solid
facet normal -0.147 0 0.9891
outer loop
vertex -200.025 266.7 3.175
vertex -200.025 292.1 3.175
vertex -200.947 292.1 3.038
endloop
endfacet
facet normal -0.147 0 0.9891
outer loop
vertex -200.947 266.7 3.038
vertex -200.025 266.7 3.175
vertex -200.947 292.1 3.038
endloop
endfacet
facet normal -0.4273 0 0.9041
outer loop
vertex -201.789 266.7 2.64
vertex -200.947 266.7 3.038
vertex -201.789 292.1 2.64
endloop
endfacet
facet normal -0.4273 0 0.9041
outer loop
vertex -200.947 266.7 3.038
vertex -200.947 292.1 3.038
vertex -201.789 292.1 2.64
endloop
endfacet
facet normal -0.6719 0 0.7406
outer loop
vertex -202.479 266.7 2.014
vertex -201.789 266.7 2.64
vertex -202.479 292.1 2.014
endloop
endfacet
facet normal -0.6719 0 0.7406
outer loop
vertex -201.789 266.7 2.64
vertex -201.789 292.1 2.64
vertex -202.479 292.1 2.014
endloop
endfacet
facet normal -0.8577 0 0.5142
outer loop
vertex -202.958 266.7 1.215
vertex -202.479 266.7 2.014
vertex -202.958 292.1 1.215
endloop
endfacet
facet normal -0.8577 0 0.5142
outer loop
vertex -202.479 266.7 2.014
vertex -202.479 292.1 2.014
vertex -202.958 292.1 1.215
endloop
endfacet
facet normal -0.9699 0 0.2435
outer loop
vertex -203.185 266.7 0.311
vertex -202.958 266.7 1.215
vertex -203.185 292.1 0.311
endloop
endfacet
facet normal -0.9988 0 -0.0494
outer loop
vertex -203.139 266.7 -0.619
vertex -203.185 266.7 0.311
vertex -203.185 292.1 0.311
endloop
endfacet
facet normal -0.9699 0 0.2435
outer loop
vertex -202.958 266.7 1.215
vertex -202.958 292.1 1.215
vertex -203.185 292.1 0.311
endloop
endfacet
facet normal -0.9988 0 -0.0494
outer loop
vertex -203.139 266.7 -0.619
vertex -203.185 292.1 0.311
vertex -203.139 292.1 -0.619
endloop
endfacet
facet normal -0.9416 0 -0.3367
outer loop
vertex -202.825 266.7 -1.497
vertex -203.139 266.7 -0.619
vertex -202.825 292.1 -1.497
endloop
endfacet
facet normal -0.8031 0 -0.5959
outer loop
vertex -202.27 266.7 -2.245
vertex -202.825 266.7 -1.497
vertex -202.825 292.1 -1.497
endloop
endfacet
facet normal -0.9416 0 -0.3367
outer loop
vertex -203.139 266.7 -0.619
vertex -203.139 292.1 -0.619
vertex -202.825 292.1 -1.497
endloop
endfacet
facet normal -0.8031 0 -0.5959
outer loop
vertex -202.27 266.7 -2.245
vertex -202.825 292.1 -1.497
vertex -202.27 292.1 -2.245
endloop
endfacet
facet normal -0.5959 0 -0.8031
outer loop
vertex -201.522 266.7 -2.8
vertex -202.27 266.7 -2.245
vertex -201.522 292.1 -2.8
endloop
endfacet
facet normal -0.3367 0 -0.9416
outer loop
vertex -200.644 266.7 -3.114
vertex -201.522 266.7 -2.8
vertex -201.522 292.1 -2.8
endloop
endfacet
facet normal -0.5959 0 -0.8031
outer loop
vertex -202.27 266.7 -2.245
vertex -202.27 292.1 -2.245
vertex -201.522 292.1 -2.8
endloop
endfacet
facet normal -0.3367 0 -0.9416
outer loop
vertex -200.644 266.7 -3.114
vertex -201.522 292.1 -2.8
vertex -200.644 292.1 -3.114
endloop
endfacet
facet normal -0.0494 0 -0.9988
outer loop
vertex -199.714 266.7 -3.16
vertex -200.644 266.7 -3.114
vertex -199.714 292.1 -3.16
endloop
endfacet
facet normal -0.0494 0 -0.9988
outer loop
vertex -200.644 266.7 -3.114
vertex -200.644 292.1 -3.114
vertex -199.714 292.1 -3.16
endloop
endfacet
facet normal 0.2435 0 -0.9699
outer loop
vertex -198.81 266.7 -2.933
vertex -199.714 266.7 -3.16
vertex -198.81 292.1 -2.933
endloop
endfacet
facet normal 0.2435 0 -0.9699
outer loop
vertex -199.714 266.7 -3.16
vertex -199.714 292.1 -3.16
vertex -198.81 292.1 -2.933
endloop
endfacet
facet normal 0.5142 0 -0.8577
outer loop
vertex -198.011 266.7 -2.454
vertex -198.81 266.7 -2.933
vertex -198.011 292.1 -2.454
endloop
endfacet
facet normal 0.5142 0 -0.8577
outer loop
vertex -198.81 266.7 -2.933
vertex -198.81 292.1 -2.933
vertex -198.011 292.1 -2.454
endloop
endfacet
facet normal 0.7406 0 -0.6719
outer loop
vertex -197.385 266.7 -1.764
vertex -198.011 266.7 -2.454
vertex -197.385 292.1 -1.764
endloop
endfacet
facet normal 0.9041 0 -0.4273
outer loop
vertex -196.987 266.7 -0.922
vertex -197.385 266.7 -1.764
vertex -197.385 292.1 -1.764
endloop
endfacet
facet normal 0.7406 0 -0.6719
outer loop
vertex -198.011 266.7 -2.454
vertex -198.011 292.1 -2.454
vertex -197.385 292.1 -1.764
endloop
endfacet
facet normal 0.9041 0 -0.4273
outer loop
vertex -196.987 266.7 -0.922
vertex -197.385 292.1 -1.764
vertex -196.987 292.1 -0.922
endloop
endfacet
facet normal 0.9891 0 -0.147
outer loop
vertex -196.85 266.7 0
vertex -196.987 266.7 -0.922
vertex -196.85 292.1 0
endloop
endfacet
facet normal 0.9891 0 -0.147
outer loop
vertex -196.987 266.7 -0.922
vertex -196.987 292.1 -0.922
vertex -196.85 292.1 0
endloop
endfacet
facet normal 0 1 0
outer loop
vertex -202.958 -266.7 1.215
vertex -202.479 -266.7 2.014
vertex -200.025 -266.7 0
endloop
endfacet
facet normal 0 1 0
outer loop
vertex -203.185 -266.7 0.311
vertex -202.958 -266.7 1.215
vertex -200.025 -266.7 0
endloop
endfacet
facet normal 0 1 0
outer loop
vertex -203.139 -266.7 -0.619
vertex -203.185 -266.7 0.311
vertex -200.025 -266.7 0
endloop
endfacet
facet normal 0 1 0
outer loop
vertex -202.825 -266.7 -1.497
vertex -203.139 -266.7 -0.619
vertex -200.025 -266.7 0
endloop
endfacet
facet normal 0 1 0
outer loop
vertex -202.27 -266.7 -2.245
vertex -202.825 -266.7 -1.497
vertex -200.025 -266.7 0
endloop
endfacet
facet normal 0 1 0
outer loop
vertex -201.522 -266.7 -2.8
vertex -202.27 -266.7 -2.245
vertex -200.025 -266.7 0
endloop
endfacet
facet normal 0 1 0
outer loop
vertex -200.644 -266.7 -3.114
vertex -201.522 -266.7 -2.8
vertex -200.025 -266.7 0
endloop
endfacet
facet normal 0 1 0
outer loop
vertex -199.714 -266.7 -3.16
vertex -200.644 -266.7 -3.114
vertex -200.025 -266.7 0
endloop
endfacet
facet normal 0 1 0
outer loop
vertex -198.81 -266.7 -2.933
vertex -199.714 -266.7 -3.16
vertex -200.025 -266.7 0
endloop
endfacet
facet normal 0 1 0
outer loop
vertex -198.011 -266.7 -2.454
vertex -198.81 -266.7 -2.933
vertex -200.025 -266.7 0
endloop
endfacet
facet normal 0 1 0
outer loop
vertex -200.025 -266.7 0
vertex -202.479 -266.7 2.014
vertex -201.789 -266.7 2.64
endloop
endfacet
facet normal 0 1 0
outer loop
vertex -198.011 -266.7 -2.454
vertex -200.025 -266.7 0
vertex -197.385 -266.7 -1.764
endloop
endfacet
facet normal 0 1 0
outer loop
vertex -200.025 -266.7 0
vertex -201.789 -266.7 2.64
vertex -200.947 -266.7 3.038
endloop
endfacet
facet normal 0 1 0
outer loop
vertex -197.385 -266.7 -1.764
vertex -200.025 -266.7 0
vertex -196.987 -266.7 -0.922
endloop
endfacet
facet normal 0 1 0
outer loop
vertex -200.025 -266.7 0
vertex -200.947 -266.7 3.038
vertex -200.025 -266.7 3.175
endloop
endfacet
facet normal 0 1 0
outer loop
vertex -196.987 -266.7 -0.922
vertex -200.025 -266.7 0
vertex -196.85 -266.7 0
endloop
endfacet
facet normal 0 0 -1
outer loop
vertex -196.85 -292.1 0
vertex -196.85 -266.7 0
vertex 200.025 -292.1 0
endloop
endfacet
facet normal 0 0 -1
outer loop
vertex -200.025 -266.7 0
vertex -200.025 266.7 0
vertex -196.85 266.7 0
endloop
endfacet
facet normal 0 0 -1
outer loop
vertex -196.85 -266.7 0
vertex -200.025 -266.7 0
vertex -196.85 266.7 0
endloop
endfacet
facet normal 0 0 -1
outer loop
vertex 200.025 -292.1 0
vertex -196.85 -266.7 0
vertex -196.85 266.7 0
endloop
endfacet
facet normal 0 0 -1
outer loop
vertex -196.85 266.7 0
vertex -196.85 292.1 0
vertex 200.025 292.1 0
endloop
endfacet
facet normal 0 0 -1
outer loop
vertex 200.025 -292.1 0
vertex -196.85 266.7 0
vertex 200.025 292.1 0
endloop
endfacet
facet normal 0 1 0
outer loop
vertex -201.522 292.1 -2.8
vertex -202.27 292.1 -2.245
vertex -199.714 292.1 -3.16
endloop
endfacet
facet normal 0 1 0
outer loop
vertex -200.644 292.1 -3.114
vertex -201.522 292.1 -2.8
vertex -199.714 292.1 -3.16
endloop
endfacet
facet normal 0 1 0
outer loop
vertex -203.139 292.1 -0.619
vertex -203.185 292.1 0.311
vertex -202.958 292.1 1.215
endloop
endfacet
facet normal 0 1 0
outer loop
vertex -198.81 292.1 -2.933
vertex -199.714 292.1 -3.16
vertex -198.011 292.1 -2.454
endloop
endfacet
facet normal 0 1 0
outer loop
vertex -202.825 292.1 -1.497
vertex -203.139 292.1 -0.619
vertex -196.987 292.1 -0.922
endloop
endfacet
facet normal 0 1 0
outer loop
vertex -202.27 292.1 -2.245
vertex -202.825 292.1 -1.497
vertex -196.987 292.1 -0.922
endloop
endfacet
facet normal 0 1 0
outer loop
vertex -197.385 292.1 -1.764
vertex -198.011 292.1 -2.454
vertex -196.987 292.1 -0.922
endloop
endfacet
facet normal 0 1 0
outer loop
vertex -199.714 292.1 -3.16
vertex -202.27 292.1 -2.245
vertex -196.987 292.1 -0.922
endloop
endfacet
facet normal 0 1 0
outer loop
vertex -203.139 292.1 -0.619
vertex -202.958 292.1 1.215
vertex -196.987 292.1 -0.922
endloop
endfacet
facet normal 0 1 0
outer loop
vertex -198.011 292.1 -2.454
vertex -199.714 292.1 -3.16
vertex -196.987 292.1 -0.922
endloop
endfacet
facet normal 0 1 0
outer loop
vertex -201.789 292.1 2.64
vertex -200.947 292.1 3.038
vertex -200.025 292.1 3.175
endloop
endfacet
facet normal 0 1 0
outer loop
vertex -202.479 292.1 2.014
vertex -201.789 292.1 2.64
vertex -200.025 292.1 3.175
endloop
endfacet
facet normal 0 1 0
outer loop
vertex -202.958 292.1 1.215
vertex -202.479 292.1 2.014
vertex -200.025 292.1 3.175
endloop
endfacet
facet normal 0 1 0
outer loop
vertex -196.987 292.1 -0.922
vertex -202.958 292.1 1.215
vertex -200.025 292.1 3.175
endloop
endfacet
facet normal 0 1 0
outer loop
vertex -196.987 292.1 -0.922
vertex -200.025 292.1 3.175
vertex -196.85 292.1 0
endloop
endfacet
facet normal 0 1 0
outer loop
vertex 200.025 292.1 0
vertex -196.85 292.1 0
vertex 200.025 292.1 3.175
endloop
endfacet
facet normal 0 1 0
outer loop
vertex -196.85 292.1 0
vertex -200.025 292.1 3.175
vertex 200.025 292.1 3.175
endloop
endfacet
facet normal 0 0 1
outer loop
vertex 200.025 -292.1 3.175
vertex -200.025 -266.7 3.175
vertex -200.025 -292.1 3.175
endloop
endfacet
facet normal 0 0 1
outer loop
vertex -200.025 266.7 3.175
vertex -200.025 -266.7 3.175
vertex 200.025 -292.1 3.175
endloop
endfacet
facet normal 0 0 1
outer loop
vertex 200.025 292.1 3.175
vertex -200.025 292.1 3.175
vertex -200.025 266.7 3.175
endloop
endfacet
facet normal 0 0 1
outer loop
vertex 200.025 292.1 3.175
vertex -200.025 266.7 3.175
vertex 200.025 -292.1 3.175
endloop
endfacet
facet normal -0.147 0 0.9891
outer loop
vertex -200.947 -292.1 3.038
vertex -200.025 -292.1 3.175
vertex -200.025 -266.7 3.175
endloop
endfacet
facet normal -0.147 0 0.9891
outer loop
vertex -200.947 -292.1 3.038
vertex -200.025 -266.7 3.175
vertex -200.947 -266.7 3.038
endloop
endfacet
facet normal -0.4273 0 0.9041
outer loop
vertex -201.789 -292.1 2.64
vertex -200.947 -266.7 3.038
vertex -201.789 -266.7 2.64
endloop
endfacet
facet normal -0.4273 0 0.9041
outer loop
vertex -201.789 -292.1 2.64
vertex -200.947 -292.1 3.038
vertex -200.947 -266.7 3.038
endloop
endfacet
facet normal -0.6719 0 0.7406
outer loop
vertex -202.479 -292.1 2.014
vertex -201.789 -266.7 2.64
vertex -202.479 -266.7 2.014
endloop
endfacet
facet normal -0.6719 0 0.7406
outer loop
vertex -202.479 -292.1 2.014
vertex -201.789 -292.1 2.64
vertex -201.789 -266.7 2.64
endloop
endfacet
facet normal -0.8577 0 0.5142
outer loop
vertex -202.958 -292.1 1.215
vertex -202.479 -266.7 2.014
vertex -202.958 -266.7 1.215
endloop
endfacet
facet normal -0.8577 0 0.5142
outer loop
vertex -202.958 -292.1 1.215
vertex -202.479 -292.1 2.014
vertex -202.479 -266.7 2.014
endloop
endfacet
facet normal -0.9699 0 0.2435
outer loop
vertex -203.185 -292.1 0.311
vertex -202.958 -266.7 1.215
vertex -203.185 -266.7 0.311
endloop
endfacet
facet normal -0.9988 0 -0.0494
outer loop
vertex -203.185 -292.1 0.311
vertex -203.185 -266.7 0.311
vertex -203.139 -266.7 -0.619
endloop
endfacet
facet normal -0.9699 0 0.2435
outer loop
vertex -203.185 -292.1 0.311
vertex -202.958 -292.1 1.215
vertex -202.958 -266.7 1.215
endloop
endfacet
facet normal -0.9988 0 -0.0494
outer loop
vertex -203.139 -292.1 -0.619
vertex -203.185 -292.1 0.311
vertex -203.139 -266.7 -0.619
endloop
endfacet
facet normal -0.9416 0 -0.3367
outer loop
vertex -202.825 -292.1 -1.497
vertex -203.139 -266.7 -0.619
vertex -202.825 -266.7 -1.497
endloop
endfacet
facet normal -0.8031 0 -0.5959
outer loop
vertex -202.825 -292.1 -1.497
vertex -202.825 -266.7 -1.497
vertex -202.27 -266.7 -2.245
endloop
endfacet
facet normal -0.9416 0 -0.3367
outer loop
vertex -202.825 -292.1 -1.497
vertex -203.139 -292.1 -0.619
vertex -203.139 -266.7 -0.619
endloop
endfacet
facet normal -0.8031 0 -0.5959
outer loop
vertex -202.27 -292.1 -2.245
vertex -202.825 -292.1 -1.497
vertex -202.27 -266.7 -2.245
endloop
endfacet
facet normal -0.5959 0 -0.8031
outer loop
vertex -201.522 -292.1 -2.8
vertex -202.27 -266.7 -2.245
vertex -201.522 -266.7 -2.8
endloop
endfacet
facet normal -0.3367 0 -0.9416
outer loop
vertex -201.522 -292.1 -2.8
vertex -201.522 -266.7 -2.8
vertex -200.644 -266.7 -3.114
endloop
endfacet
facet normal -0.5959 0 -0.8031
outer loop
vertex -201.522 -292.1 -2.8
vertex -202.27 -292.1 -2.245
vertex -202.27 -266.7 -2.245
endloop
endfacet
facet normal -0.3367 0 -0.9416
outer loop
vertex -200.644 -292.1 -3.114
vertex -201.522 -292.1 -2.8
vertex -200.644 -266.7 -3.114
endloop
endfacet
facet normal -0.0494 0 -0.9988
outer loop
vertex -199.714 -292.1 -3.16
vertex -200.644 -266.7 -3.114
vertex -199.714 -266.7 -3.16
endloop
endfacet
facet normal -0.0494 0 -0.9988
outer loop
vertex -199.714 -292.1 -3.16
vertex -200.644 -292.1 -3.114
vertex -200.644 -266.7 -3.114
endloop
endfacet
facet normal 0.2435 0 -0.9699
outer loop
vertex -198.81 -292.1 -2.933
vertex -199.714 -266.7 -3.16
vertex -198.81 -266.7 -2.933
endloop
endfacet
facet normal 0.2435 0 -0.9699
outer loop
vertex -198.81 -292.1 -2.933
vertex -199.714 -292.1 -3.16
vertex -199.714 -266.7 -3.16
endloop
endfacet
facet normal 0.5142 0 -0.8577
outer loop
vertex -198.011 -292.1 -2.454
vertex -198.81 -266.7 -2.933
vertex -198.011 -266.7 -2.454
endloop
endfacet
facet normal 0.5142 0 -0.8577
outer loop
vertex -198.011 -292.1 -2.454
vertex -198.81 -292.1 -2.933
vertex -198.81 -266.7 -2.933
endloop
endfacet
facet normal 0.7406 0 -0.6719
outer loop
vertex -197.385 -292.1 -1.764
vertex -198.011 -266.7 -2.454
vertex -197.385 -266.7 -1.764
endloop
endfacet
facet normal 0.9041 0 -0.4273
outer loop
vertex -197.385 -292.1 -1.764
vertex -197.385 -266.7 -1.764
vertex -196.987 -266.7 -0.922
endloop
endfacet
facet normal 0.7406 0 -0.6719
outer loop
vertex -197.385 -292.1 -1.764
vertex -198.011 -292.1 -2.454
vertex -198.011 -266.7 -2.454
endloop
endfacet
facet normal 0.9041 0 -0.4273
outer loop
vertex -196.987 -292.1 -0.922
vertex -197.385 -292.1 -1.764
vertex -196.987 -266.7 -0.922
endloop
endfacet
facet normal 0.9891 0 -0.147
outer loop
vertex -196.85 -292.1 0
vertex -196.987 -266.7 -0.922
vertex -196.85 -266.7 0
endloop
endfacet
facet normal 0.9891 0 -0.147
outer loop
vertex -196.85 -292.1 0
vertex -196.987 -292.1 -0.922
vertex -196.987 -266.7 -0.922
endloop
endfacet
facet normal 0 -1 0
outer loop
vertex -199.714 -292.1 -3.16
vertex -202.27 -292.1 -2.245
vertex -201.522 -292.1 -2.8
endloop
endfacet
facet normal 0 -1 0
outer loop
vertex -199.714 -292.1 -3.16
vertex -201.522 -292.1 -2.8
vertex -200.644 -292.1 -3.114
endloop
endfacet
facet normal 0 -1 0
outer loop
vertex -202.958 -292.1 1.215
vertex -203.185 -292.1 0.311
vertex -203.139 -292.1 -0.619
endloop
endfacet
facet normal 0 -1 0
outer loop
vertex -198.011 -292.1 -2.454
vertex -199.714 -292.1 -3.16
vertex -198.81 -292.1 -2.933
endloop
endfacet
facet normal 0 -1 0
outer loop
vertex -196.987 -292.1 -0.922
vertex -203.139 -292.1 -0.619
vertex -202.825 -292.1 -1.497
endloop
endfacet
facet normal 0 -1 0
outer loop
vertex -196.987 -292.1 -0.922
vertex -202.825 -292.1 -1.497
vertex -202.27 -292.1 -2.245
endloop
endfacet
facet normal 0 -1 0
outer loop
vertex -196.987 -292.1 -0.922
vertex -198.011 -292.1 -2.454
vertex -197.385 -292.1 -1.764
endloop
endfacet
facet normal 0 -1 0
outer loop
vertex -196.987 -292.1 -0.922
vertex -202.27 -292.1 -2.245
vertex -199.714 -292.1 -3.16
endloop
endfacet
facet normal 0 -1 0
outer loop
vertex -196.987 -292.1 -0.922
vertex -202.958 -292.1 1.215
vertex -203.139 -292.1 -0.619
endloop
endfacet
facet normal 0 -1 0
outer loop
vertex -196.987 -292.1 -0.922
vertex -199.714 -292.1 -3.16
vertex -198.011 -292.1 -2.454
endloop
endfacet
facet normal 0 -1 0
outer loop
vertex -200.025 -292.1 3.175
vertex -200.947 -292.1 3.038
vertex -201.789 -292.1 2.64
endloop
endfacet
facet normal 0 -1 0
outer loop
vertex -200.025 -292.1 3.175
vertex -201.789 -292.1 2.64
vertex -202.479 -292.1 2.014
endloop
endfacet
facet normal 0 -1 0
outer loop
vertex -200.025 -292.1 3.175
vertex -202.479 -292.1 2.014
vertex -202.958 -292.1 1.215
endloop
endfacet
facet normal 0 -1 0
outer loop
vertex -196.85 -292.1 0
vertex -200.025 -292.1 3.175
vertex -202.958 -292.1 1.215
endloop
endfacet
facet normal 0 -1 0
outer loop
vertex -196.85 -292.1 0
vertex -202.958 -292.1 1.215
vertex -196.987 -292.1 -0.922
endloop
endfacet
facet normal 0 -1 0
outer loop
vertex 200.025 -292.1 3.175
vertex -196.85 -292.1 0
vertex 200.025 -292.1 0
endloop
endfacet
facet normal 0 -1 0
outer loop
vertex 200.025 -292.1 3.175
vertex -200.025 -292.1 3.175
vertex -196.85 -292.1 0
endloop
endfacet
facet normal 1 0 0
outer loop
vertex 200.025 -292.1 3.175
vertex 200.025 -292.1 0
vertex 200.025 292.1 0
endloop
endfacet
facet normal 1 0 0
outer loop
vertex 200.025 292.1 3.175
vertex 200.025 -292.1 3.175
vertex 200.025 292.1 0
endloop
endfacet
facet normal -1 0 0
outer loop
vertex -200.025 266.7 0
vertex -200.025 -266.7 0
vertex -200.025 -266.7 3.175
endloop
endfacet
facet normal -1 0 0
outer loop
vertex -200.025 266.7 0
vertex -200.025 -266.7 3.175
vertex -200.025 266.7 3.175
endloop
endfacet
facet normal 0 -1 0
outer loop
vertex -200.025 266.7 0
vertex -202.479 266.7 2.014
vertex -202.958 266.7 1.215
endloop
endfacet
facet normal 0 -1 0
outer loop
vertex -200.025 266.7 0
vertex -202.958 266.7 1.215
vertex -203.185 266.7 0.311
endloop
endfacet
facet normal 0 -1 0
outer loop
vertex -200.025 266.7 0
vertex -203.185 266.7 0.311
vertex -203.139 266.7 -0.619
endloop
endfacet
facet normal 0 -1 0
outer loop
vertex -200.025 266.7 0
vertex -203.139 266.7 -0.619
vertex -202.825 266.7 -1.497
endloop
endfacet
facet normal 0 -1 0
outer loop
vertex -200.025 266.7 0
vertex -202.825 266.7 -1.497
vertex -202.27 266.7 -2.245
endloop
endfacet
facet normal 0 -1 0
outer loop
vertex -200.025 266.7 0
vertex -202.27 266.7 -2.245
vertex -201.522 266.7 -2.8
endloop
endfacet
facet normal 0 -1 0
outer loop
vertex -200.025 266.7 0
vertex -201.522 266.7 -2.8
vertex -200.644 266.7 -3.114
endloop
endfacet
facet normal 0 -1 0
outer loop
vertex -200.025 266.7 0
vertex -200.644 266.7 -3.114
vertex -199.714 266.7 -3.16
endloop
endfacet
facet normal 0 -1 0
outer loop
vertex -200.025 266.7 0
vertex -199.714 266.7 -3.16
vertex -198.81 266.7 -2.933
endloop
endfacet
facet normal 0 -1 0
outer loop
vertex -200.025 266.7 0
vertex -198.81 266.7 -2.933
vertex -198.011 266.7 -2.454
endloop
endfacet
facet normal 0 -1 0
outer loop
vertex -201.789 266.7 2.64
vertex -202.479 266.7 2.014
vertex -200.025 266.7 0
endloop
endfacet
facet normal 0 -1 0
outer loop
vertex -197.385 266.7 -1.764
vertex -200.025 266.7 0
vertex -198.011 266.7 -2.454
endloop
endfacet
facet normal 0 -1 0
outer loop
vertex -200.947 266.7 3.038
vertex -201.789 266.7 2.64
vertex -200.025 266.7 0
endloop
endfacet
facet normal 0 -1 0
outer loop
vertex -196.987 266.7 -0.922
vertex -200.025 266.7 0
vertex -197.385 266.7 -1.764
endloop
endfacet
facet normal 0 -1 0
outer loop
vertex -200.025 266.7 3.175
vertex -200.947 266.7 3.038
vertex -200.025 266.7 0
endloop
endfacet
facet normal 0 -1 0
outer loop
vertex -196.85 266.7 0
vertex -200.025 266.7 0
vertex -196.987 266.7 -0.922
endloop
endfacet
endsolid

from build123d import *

# Parameters (mm, degrees)
F0_W     = 400.05
F0_H     = 584.2
F1_DEPTH = 3.175
F3_DEPTH = 25.4


with BuildPart() as f1:
    # F0 (on Top) → F1 (new body)
    with BuildSketch(Plane.XY):
        Rectangle(F0_W, F0_H)
    extrude(amount=F1_DEPTH)

    # F2 (on face) → F3 (join)
    with BuildSketch(Plane.XZ.offset(292.1)):
        with BuildLine():
            ThreePointArc((-200.025, 3.175), (-202.2700640303, -2.2450640303), (-196.85, 0))
            Line((-196.85, 0), (-200.025, 0))
            Line((-200.025, 0), (-200.025, 3.175))
        make_face()
    extrude(amount=-F3_DEPTH)

    # F4: F1 across plane


with BuildPart() as f1_1:
    add(f1.part)
    add(f1.part.mirror(Plane.XZ))


solid = f1_1.part
